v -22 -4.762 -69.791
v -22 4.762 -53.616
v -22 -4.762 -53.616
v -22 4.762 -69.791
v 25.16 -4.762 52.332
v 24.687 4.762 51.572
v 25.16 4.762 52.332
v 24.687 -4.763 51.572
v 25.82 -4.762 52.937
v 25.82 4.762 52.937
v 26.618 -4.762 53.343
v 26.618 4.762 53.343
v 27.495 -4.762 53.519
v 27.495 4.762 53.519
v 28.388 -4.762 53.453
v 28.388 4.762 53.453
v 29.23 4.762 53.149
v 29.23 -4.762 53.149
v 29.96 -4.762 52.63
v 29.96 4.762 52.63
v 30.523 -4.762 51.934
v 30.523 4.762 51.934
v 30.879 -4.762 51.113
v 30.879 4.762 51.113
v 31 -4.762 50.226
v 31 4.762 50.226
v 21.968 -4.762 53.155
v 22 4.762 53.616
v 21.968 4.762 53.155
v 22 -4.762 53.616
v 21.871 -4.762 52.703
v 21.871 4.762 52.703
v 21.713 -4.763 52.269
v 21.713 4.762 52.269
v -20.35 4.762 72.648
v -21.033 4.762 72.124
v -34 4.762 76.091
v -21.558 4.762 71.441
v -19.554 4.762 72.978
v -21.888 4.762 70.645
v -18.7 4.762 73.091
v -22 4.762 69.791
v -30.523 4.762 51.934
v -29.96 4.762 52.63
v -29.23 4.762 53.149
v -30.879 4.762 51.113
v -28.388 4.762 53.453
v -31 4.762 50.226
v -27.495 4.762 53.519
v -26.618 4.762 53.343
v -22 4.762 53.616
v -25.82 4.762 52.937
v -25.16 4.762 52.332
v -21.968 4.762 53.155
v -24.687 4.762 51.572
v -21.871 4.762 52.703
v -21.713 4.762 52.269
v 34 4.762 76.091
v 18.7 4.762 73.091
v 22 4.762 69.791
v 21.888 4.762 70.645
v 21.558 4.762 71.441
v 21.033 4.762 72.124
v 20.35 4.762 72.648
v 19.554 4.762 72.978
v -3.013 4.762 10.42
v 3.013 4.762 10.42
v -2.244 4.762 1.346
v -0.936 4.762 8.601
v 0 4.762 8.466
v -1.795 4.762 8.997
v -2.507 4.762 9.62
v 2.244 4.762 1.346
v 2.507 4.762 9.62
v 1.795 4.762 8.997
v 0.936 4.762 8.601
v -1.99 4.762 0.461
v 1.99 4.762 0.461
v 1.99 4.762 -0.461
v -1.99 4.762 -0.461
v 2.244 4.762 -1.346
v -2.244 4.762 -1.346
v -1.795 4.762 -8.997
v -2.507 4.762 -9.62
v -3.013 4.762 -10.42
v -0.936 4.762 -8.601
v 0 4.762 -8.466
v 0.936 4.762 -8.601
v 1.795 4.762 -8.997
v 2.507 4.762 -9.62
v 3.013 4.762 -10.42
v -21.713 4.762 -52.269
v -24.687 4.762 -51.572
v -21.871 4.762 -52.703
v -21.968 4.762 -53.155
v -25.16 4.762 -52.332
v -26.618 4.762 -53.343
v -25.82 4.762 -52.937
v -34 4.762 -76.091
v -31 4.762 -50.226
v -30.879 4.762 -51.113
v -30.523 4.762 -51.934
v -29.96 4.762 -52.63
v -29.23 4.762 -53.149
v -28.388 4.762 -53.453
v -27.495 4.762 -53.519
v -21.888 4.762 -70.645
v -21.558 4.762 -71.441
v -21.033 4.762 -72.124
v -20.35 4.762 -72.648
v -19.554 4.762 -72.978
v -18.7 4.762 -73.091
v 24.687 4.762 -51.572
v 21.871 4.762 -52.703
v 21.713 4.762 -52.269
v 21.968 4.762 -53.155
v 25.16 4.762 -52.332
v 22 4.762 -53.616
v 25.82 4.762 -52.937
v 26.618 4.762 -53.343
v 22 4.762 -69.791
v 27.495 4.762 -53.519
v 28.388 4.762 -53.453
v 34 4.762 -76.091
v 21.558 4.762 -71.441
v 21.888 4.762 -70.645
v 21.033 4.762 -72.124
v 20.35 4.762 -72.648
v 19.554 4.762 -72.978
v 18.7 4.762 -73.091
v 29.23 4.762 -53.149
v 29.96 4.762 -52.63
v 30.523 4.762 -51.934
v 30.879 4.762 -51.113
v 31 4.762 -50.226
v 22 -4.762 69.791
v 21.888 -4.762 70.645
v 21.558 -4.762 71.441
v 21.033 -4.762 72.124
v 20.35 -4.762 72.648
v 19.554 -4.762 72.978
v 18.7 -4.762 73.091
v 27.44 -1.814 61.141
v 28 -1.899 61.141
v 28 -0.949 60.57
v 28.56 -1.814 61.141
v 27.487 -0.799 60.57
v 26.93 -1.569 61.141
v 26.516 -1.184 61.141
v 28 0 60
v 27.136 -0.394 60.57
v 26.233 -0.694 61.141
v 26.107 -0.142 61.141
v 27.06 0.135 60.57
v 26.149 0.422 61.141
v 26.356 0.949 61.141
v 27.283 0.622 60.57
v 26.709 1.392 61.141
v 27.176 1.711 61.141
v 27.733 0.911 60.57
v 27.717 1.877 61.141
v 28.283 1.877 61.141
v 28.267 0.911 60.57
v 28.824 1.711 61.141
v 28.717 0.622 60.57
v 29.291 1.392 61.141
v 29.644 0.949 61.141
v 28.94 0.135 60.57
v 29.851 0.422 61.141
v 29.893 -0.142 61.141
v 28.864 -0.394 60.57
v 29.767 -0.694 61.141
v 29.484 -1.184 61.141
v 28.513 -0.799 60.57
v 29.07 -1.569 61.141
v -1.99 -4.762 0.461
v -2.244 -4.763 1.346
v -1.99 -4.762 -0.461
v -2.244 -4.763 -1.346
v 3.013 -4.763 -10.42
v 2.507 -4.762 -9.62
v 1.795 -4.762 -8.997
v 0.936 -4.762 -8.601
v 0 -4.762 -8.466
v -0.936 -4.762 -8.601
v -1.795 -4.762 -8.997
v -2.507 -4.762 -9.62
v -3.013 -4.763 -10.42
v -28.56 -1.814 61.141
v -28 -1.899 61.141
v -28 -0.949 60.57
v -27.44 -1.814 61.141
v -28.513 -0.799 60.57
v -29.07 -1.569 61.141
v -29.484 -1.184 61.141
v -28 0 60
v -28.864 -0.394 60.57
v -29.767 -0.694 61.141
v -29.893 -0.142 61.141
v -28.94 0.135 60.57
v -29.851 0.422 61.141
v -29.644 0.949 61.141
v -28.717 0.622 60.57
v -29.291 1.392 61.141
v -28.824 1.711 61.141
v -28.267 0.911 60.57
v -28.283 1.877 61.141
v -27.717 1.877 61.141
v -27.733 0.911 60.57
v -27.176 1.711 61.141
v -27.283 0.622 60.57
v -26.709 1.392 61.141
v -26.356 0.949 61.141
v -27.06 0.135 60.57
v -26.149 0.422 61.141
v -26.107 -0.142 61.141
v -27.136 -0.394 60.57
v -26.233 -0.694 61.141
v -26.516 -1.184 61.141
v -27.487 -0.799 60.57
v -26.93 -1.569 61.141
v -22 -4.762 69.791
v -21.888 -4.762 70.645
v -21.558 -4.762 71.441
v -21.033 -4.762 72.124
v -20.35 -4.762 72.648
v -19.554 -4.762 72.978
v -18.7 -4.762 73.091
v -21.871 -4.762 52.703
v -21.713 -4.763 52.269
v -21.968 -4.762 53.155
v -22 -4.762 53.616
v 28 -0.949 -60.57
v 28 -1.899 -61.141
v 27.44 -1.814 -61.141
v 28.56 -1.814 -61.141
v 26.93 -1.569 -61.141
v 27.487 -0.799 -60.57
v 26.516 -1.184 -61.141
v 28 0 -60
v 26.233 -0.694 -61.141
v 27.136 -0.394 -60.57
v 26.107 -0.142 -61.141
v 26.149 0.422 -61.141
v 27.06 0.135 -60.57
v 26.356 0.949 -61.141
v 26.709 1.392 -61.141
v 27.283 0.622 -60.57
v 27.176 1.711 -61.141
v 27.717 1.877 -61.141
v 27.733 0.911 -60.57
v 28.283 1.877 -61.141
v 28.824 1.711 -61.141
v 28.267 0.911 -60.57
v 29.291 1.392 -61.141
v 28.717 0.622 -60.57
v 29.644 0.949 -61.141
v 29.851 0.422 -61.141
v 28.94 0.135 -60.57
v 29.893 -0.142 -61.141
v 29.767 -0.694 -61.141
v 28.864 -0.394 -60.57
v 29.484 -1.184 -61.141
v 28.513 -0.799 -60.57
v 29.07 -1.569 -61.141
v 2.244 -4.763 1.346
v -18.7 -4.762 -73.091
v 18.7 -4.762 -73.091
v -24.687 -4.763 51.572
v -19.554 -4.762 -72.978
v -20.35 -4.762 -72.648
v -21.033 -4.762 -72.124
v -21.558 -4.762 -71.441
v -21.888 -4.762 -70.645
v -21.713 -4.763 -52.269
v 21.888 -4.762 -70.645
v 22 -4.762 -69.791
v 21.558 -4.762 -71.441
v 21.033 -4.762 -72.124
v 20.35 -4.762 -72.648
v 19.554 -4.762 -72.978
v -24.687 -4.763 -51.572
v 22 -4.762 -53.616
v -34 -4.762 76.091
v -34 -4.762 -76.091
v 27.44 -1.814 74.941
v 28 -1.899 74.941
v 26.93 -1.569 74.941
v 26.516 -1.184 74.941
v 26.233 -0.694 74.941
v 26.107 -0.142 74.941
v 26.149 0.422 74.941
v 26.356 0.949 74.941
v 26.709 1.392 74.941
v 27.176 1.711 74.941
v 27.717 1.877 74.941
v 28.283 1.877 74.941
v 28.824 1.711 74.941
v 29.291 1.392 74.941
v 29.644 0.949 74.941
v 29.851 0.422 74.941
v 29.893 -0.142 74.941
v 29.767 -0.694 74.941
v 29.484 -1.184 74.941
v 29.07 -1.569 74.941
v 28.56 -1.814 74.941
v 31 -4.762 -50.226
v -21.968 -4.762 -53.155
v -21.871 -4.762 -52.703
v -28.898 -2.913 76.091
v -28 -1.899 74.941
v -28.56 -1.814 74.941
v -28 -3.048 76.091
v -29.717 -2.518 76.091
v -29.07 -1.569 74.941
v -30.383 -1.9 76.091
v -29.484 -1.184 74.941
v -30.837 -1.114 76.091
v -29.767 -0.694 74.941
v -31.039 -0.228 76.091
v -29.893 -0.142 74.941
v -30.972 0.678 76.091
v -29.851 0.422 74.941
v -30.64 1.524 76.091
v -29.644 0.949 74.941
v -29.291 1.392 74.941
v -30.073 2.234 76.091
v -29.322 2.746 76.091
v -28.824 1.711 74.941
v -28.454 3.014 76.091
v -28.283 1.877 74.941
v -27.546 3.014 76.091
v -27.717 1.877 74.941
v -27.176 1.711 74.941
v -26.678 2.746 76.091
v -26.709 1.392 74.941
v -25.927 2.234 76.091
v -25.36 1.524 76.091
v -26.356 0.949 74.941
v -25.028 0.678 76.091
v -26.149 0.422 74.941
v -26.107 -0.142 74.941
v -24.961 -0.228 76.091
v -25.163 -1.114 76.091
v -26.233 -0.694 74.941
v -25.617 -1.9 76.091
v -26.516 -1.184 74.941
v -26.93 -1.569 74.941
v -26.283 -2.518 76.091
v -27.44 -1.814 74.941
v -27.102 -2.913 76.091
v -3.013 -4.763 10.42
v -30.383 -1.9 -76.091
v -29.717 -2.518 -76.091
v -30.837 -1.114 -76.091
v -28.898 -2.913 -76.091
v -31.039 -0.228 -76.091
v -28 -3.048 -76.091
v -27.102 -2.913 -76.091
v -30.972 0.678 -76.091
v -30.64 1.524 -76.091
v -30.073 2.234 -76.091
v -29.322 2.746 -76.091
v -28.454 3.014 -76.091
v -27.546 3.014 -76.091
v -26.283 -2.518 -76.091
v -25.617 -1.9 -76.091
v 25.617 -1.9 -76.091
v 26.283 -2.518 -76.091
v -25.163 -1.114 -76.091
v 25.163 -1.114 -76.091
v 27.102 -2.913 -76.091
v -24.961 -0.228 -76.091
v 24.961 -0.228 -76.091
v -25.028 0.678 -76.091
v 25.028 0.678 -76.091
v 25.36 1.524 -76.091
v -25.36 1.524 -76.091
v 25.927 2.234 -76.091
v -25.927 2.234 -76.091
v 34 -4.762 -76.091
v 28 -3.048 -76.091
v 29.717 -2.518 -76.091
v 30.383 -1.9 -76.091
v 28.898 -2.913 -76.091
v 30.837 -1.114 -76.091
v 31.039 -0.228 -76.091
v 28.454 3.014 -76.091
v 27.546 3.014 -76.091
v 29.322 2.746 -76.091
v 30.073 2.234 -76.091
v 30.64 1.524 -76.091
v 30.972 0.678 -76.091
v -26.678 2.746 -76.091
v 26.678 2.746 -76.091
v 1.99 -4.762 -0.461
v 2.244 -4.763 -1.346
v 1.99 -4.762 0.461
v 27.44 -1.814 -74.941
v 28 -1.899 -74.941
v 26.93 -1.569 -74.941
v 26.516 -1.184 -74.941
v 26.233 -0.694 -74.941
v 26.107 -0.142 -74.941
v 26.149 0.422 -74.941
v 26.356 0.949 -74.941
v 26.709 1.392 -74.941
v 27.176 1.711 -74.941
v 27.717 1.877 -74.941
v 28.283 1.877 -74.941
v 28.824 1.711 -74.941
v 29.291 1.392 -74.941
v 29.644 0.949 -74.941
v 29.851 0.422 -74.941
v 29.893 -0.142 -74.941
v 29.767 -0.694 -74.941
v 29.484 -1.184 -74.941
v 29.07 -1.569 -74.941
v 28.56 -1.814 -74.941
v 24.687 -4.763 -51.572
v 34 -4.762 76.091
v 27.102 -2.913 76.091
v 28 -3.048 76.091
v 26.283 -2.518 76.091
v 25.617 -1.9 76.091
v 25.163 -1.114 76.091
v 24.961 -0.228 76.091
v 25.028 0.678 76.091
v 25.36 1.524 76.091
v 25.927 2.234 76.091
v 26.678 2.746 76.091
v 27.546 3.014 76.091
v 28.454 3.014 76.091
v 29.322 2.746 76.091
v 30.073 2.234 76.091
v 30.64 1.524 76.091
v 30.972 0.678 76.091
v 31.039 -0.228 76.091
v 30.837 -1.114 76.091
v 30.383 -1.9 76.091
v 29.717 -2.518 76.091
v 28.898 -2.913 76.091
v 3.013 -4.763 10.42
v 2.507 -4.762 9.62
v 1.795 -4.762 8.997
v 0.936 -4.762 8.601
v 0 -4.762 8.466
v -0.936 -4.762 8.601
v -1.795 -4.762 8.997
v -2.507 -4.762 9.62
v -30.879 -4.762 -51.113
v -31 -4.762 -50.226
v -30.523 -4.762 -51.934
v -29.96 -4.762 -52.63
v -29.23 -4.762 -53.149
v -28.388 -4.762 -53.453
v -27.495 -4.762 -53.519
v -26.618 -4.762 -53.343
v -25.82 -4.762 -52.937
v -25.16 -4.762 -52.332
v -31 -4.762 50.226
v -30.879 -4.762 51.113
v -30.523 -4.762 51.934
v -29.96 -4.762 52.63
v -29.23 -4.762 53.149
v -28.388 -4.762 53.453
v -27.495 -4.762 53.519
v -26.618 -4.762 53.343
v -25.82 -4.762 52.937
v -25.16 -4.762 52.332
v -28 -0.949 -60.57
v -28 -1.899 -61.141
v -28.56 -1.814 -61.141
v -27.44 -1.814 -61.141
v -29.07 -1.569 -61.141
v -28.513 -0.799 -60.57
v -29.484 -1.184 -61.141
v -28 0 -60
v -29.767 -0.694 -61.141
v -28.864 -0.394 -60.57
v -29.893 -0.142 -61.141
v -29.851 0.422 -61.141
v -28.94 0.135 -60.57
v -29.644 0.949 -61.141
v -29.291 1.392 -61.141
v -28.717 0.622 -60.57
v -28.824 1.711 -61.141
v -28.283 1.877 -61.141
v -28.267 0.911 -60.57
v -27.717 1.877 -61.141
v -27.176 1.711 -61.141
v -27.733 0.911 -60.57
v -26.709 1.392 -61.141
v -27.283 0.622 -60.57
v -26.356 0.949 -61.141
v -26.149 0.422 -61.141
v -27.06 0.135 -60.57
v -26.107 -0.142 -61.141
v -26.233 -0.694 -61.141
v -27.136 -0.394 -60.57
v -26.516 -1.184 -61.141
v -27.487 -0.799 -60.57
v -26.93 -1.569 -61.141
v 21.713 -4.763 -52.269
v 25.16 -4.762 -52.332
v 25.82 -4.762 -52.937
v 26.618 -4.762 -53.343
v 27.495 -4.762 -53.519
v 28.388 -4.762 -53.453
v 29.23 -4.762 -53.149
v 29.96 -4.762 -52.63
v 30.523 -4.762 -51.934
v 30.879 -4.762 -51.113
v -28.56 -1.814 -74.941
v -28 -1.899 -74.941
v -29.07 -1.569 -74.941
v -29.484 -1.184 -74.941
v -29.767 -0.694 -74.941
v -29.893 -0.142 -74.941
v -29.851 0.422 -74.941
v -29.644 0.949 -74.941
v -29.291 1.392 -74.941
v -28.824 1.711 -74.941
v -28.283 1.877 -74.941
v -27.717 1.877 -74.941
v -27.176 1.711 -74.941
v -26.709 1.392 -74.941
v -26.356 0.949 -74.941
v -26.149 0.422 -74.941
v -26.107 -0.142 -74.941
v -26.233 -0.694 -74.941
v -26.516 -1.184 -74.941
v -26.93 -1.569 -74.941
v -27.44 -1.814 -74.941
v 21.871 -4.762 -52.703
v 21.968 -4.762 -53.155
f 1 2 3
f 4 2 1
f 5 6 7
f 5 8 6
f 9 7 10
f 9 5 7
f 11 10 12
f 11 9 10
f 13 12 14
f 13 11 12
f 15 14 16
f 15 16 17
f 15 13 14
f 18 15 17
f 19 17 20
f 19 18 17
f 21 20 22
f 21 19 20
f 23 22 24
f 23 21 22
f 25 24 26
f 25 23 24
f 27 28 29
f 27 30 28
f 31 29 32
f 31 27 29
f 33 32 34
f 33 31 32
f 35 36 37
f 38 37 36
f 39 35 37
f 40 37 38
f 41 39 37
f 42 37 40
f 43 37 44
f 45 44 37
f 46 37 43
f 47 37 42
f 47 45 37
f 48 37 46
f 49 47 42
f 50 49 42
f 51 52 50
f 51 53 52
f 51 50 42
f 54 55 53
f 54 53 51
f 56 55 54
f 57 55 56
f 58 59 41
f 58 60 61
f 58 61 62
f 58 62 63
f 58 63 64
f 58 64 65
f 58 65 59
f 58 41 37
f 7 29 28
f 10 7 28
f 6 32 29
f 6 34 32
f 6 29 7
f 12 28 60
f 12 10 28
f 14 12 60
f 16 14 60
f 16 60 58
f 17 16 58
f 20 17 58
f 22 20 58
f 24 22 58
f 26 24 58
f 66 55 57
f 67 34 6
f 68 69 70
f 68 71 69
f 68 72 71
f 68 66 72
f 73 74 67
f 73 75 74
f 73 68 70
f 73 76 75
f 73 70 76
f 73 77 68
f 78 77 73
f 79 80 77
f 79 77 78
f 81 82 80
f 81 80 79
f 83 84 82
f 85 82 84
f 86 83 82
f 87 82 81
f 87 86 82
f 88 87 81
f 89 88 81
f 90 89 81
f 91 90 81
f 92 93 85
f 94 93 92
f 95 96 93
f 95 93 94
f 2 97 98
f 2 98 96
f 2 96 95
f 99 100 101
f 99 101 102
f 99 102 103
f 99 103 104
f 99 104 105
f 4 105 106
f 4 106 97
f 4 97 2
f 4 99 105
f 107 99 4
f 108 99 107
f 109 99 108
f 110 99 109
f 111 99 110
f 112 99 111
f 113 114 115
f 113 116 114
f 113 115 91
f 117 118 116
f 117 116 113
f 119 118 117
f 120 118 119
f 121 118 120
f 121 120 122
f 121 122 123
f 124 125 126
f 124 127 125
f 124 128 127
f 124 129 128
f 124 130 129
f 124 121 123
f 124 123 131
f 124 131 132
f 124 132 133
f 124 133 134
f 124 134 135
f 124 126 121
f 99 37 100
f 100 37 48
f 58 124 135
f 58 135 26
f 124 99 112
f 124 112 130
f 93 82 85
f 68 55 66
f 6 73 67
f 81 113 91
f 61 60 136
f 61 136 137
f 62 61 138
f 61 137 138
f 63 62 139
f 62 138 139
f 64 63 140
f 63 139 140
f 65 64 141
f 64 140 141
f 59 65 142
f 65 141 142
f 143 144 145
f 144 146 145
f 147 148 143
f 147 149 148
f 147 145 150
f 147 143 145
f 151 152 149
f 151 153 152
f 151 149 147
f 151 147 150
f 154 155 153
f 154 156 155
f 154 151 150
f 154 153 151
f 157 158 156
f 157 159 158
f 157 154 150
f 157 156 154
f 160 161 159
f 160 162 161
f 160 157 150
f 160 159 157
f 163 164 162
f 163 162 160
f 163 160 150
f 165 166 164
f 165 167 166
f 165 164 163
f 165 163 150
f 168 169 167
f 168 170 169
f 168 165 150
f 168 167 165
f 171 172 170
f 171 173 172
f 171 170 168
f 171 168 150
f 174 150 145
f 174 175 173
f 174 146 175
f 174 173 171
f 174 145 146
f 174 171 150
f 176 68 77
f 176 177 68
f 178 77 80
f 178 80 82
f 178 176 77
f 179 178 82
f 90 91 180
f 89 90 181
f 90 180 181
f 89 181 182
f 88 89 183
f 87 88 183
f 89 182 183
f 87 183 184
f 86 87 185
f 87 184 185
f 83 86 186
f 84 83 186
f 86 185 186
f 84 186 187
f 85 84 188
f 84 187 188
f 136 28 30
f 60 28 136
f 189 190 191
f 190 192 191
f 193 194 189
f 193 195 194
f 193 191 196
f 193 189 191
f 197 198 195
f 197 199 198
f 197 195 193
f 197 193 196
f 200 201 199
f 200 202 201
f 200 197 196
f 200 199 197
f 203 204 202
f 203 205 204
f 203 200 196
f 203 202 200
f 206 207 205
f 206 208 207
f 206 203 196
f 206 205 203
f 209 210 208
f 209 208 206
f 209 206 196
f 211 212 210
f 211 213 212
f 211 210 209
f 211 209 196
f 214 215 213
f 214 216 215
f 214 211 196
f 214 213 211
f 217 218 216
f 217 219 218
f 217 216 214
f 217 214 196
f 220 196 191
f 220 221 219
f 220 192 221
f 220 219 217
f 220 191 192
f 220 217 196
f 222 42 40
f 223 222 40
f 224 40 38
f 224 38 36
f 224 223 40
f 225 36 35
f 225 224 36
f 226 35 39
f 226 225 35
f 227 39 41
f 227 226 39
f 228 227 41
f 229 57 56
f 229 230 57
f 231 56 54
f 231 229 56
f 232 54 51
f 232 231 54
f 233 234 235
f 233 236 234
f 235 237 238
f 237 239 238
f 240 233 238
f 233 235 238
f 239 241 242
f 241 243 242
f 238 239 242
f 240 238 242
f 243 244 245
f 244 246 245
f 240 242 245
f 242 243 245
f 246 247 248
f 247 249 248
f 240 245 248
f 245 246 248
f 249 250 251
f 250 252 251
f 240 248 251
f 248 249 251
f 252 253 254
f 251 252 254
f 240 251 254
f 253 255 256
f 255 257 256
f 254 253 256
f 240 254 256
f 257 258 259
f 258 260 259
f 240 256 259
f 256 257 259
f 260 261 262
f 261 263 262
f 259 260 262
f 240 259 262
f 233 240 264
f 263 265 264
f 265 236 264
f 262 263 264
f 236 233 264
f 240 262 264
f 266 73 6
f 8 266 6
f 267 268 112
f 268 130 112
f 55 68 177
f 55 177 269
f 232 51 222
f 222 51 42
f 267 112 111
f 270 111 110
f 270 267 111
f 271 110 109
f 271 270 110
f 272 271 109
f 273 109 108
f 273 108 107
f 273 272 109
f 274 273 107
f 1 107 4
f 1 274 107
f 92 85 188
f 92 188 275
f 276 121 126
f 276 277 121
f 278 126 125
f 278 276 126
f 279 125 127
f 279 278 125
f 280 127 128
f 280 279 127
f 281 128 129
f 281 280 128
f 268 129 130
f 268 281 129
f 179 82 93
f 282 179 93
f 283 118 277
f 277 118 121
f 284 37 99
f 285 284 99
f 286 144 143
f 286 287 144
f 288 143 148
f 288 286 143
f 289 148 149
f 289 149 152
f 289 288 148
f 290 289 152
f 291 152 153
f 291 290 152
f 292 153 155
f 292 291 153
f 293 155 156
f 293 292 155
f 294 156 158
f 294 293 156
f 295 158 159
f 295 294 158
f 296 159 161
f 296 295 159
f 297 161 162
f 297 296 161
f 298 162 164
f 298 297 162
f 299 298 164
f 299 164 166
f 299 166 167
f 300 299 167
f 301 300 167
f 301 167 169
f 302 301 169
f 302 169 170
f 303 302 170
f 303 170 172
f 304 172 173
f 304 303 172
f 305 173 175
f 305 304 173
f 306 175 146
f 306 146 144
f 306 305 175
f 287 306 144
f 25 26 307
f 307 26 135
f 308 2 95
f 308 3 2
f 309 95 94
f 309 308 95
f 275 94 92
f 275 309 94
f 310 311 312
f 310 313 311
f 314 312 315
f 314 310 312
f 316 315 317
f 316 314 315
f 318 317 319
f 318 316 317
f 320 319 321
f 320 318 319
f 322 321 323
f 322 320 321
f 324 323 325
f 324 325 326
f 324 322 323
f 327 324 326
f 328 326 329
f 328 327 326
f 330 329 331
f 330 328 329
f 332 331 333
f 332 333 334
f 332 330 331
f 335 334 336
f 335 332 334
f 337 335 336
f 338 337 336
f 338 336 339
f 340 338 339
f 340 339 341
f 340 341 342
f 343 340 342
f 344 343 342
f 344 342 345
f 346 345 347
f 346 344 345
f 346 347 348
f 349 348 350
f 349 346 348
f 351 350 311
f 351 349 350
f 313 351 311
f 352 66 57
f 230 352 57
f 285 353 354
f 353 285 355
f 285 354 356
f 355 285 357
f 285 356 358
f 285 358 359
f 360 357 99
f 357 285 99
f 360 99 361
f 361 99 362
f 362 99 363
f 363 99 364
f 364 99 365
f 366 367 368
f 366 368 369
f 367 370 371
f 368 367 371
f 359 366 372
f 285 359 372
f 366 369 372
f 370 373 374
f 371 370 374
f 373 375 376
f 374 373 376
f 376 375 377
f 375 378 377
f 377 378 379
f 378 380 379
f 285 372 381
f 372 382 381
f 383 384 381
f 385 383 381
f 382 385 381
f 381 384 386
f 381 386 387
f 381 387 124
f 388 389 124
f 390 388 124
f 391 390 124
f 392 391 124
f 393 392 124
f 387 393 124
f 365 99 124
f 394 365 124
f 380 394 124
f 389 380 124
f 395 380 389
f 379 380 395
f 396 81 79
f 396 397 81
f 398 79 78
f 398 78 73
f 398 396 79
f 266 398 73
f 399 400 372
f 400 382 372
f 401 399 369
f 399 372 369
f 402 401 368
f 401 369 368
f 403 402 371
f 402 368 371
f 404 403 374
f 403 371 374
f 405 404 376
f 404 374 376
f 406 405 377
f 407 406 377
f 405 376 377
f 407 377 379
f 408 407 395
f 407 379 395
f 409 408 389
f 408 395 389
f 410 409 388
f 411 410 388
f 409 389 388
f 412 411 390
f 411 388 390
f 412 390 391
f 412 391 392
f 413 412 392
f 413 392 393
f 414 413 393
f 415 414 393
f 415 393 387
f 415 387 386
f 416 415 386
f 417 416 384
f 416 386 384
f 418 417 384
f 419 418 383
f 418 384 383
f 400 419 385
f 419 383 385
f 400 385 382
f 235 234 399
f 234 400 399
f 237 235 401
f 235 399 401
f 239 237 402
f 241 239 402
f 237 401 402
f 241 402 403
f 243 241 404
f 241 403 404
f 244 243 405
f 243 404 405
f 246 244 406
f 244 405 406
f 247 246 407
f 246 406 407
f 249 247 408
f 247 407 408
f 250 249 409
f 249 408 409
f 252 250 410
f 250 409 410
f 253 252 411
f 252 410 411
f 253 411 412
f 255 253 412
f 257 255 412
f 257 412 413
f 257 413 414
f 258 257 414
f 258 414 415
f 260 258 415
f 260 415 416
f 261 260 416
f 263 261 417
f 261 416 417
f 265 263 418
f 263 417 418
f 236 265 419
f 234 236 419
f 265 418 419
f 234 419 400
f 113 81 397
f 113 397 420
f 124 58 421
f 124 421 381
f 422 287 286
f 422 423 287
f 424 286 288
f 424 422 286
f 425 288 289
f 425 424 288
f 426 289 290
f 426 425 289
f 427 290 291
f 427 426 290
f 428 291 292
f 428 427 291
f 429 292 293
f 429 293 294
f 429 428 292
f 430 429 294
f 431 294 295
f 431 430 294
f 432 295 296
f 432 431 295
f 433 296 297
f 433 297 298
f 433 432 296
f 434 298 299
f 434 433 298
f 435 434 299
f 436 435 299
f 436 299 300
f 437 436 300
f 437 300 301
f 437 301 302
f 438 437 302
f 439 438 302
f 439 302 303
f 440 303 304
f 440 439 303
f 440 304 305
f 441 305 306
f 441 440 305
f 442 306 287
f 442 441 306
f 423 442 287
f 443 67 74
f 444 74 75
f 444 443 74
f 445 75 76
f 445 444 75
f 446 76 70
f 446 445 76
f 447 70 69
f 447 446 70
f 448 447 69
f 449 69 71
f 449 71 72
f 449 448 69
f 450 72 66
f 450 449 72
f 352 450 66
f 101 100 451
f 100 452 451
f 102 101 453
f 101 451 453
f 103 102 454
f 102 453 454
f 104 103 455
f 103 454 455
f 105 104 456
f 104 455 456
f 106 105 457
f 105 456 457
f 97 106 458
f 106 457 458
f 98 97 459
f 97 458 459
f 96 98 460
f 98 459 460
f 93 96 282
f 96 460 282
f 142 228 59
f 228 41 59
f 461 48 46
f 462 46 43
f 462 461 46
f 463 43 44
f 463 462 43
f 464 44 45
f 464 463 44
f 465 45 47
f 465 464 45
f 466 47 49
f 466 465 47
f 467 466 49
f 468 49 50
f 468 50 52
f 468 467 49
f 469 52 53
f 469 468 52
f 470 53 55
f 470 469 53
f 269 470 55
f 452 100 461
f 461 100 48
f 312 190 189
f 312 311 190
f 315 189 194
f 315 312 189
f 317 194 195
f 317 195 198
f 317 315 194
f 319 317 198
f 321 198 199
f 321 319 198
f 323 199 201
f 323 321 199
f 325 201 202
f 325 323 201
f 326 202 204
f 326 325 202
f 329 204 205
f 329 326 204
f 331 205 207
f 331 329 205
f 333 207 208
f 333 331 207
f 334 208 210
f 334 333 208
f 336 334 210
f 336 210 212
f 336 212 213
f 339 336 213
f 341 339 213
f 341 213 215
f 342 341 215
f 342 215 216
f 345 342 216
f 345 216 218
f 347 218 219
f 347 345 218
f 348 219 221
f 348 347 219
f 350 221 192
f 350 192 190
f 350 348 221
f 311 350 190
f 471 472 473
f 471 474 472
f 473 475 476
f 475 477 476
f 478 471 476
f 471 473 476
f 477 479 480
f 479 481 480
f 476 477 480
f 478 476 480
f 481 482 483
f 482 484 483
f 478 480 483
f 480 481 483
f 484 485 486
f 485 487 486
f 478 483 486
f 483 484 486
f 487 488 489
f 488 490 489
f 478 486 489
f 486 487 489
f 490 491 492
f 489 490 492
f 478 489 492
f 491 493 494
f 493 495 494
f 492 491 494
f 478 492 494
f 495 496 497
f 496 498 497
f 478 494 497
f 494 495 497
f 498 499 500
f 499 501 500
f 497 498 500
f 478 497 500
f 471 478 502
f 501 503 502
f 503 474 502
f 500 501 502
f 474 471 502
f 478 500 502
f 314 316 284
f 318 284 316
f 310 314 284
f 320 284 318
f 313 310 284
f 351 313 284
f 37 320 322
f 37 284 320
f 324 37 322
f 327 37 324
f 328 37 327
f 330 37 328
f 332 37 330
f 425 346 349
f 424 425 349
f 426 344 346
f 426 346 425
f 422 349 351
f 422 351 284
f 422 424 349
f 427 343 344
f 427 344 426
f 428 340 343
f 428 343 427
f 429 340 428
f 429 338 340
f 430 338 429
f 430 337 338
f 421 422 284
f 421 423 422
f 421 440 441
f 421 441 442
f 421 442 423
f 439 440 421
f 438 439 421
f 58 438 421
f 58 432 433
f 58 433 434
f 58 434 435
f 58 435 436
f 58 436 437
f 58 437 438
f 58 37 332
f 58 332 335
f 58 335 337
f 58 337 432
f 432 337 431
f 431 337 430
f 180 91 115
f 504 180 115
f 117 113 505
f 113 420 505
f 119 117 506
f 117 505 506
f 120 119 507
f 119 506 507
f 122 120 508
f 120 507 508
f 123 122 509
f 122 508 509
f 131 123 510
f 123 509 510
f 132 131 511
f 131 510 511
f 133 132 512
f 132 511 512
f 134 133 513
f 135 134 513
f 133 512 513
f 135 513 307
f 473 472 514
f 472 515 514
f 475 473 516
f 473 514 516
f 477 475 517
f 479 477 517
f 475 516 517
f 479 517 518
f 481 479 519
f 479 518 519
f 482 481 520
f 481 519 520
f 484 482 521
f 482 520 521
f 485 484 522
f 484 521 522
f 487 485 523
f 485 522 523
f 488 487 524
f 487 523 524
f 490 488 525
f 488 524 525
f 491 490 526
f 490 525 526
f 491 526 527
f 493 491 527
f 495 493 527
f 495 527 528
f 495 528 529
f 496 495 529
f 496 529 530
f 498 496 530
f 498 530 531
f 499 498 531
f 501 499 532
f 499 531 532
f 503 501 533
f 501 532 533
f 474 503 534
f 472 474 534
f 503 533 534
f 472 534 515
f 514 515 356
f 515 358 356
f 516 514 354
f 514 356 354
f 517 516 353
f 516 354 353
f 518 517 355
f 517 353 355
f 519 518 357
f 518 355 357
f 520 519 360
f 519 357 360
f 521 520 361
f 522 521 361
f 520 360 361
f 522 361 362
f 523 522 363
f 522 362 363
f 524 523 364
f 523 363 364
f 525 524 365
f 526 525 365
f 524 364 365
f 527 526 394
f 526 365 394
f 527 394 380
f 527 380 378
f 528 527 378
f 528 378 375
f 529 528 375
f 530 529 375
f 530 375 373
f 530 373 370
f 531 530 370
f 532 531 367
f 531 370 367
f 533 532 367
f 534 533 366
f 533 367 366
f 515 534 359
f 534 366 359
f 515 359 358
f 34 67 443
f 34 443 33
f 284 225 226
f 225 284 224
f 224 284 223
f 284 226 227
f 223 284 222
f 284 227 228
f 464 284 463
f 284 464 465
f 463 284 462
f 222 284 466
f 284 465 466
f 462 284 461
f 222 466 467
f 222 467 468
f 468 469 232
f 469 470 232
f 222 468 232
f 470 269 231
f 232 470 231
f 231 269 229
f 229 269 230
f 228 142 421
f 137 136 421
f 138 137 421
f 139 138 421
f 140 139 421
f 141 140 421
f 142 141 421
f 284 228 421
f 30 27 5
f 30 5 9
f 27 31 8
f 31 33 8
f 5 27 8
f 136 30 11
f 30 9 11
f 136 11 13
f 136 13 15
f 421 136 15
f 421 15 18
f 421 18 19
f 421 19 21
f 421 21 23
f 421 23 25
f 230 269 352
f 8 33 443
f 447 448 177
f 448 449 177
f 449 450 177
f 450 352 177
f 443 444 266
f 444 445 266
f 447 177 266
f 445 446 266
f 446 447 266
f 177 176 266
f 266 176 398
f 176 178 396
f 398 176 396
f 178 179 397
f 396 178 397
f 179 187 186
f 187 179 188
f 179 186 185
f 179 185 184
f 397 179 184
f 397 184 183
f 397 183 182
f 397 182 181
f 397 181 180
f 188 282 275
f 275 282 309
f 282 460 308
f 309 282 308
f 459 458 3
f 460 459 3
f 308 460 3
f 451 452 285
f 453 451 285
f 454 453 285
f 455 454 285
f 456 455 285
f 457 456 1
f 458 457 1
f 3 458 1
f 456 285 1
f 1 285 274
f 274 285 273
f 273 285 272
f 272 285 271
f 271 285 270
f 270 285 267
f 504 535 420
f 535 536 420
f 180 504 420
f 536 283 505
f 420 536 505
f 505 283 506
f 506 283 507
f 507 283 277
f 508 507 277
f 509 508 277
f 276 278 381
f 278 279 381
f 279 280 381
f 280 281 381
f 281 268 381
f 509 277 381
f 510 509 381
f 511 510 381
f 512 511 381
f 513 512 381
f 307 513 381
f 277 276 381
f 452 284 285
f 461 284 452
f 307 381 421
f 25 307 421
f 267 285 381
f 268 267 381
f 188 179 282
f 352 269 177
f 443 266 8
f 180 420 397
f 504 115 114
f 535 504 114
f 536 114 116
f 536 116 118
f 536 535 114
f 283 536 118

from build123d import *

# Parameters (mm, degrees)
SKETCH1_W                       = 68
SKETCH1_H                       = 152.18109071
BOSS_EXTRUDE1_DEPTH             = 4.7625
CUT_EXTRUDE2_DEPTH              = 10.525
MIRROR3_COPY_1_DEPTH            = 10.525
FILLET1_R                       = 3.3
F_10_24_TAPPED_HOLE1_AT_2_COUNT = 2
F_10_24_TAPPED_HOLE1_AT_2_PITCH = 56


with BuildPart() as part:
    # Sketch1 → Boss-Extrude1 (new body, symmetric)
    with BuildSketch(Plane(origin=(0, 0, 0), x_dir=(1, 0, 0), z_dir=(0, 1, 0))):
        Rectangle(SKETCH1_W, SKETCH1_H)
    extrude(amount=BOSS_EXTRUDE1_DEPTH, both=True)

    # Sketch5 → Cut-Extrude2 (cut, through all)
    with BuildSketch(Plane(origin=(0, 4.7625, 0), x_dir=(1, 0, 0), z_dir=(0, 1, 0))):
        Polygon((-31, -65.699851963), (-31, 0), (-1.642936566, 0), align=None)
        Polygon((-22, -73.090545355), (0, -73.090545355), (0, -3.676821743), (-22, -52.911880502), align=None)
    cut_extrude2 = extrude(amount=-CUT_EXTRUDE2_DEPTH, mode=Mode.SUBTRACT)

    # Mirror2: Cut-Extrude2 across plane
    add(cut_extrude2.mirror(Plane(origin=(0, 0, 0), x_dir=(0, 0, 1), z_dir=(1, 0, 0))), mode=Mode.SUBTRACT)

    # Mirror3: Cut-Extrude2 across plane
    add(cut_extrude2.mirror(Plane.XY), mode=Mode.SUBTRACT)

    # Mirror3 copy 1 sketch → Mirror3 copy 1 (cut, through all)
    with BuildSketch(Plane(origin=(0, 4.7625, 0), x_dir=(-1, 0, 0), z_dir=(0, 1, 0))):
        Polygon((-31, -65.699851963), (-31, 0), (-1.642936566, 0), align=None)
        Polygon((-22, -73.090545355), (0, -73.090545355), (0, -3.676821743), (-22, -52.911880502), align=None)
    extrude(amount=-MIRROR3_COPY_1_DEPTH, mode=Mode.SUBTRACT)

    # Fillet1
    fillet1_edges = [part.edges().sort_by_distance(p)[0] for p in [
        (-1.642936566, 0, 0),
        (-31, 0, 65.699851963),
        (0, 0, 3.676821743),
        (-22, 0, 73.090545355),
        (-22, 0, 52.911880502),
        (31, 0, 65.699851963),
        (1.642936566, 0, 0),
        (22, 0, 52.911880502),
        (22, 0, 73.090545355),
        (31, 0, -65.699851963),
        (0, 0, -3.676821743),
        (22, 0, -73.090545355),
        (22, 0, -52.911880502),
        (-31, 0, -65.699851963),
        (-22, 0, -52.911880502),
        (-22, 0, -73.090545355),
    ]]
    fillet(fillet1_edges, radius=FILLET1_R)

    # Sketch2 → #10-24 Tapped Hole1 (revolve, cut)
    with BuildSketch(Plane(origin=(-28, 0, 76.090545355), x_dir=(0, -1, 0), z_dir=(1, 0, 0))):
        Polygon((0, 0), (0, 16.090824014), (1.89865, 14.95), (1.89865, 1.14935), (3.048, 0), align=None)
    f_10_24_tapped_hole1 = revolve(axis=Axis((-28, 0, 82.440545355), (0, 0, -1)), mode=Mode.SUBTRACT)

    # #10-24 Tapped Hole1 at 2: #10-24 Tapped Hole1 ×2
    with Locations(*[(i * F_10_24_TAPPED_HOLE1_AT_2_PITCH, 0, 0) for i in range(1, F_10_24_TAPPED_HOLE1_AT_2_COUNT)]):
        add(f_10_24_tapped_hole1, mode=Mode.SUBTRACT)

    # Mirror1: #10-24 Tapped Hole1 across plane
    add(f_10_24_tapped_hole1.mirror(Plane.XY), mode=Mode.SUBTRACT)

    # Mirror1 copy 1 sketch → Mirror1 copy 1 (revolve, cut)
    with BuildSketch(Plane(origin=(28, 0, -76.090545355), x_dir=(0, -1, 0), z_dir=(1, 0, 0))):
        Polygon((0, 0), (0, -16.090824014), (1.89865, -14.95), (1.89865, -1.14935), (3.048, 0), align=None)
    revolve(axis=Axis((28, 0, -82.440545355), (0, 0, -1)), mode=Mode.SUBTRACT)


solid = part.part
